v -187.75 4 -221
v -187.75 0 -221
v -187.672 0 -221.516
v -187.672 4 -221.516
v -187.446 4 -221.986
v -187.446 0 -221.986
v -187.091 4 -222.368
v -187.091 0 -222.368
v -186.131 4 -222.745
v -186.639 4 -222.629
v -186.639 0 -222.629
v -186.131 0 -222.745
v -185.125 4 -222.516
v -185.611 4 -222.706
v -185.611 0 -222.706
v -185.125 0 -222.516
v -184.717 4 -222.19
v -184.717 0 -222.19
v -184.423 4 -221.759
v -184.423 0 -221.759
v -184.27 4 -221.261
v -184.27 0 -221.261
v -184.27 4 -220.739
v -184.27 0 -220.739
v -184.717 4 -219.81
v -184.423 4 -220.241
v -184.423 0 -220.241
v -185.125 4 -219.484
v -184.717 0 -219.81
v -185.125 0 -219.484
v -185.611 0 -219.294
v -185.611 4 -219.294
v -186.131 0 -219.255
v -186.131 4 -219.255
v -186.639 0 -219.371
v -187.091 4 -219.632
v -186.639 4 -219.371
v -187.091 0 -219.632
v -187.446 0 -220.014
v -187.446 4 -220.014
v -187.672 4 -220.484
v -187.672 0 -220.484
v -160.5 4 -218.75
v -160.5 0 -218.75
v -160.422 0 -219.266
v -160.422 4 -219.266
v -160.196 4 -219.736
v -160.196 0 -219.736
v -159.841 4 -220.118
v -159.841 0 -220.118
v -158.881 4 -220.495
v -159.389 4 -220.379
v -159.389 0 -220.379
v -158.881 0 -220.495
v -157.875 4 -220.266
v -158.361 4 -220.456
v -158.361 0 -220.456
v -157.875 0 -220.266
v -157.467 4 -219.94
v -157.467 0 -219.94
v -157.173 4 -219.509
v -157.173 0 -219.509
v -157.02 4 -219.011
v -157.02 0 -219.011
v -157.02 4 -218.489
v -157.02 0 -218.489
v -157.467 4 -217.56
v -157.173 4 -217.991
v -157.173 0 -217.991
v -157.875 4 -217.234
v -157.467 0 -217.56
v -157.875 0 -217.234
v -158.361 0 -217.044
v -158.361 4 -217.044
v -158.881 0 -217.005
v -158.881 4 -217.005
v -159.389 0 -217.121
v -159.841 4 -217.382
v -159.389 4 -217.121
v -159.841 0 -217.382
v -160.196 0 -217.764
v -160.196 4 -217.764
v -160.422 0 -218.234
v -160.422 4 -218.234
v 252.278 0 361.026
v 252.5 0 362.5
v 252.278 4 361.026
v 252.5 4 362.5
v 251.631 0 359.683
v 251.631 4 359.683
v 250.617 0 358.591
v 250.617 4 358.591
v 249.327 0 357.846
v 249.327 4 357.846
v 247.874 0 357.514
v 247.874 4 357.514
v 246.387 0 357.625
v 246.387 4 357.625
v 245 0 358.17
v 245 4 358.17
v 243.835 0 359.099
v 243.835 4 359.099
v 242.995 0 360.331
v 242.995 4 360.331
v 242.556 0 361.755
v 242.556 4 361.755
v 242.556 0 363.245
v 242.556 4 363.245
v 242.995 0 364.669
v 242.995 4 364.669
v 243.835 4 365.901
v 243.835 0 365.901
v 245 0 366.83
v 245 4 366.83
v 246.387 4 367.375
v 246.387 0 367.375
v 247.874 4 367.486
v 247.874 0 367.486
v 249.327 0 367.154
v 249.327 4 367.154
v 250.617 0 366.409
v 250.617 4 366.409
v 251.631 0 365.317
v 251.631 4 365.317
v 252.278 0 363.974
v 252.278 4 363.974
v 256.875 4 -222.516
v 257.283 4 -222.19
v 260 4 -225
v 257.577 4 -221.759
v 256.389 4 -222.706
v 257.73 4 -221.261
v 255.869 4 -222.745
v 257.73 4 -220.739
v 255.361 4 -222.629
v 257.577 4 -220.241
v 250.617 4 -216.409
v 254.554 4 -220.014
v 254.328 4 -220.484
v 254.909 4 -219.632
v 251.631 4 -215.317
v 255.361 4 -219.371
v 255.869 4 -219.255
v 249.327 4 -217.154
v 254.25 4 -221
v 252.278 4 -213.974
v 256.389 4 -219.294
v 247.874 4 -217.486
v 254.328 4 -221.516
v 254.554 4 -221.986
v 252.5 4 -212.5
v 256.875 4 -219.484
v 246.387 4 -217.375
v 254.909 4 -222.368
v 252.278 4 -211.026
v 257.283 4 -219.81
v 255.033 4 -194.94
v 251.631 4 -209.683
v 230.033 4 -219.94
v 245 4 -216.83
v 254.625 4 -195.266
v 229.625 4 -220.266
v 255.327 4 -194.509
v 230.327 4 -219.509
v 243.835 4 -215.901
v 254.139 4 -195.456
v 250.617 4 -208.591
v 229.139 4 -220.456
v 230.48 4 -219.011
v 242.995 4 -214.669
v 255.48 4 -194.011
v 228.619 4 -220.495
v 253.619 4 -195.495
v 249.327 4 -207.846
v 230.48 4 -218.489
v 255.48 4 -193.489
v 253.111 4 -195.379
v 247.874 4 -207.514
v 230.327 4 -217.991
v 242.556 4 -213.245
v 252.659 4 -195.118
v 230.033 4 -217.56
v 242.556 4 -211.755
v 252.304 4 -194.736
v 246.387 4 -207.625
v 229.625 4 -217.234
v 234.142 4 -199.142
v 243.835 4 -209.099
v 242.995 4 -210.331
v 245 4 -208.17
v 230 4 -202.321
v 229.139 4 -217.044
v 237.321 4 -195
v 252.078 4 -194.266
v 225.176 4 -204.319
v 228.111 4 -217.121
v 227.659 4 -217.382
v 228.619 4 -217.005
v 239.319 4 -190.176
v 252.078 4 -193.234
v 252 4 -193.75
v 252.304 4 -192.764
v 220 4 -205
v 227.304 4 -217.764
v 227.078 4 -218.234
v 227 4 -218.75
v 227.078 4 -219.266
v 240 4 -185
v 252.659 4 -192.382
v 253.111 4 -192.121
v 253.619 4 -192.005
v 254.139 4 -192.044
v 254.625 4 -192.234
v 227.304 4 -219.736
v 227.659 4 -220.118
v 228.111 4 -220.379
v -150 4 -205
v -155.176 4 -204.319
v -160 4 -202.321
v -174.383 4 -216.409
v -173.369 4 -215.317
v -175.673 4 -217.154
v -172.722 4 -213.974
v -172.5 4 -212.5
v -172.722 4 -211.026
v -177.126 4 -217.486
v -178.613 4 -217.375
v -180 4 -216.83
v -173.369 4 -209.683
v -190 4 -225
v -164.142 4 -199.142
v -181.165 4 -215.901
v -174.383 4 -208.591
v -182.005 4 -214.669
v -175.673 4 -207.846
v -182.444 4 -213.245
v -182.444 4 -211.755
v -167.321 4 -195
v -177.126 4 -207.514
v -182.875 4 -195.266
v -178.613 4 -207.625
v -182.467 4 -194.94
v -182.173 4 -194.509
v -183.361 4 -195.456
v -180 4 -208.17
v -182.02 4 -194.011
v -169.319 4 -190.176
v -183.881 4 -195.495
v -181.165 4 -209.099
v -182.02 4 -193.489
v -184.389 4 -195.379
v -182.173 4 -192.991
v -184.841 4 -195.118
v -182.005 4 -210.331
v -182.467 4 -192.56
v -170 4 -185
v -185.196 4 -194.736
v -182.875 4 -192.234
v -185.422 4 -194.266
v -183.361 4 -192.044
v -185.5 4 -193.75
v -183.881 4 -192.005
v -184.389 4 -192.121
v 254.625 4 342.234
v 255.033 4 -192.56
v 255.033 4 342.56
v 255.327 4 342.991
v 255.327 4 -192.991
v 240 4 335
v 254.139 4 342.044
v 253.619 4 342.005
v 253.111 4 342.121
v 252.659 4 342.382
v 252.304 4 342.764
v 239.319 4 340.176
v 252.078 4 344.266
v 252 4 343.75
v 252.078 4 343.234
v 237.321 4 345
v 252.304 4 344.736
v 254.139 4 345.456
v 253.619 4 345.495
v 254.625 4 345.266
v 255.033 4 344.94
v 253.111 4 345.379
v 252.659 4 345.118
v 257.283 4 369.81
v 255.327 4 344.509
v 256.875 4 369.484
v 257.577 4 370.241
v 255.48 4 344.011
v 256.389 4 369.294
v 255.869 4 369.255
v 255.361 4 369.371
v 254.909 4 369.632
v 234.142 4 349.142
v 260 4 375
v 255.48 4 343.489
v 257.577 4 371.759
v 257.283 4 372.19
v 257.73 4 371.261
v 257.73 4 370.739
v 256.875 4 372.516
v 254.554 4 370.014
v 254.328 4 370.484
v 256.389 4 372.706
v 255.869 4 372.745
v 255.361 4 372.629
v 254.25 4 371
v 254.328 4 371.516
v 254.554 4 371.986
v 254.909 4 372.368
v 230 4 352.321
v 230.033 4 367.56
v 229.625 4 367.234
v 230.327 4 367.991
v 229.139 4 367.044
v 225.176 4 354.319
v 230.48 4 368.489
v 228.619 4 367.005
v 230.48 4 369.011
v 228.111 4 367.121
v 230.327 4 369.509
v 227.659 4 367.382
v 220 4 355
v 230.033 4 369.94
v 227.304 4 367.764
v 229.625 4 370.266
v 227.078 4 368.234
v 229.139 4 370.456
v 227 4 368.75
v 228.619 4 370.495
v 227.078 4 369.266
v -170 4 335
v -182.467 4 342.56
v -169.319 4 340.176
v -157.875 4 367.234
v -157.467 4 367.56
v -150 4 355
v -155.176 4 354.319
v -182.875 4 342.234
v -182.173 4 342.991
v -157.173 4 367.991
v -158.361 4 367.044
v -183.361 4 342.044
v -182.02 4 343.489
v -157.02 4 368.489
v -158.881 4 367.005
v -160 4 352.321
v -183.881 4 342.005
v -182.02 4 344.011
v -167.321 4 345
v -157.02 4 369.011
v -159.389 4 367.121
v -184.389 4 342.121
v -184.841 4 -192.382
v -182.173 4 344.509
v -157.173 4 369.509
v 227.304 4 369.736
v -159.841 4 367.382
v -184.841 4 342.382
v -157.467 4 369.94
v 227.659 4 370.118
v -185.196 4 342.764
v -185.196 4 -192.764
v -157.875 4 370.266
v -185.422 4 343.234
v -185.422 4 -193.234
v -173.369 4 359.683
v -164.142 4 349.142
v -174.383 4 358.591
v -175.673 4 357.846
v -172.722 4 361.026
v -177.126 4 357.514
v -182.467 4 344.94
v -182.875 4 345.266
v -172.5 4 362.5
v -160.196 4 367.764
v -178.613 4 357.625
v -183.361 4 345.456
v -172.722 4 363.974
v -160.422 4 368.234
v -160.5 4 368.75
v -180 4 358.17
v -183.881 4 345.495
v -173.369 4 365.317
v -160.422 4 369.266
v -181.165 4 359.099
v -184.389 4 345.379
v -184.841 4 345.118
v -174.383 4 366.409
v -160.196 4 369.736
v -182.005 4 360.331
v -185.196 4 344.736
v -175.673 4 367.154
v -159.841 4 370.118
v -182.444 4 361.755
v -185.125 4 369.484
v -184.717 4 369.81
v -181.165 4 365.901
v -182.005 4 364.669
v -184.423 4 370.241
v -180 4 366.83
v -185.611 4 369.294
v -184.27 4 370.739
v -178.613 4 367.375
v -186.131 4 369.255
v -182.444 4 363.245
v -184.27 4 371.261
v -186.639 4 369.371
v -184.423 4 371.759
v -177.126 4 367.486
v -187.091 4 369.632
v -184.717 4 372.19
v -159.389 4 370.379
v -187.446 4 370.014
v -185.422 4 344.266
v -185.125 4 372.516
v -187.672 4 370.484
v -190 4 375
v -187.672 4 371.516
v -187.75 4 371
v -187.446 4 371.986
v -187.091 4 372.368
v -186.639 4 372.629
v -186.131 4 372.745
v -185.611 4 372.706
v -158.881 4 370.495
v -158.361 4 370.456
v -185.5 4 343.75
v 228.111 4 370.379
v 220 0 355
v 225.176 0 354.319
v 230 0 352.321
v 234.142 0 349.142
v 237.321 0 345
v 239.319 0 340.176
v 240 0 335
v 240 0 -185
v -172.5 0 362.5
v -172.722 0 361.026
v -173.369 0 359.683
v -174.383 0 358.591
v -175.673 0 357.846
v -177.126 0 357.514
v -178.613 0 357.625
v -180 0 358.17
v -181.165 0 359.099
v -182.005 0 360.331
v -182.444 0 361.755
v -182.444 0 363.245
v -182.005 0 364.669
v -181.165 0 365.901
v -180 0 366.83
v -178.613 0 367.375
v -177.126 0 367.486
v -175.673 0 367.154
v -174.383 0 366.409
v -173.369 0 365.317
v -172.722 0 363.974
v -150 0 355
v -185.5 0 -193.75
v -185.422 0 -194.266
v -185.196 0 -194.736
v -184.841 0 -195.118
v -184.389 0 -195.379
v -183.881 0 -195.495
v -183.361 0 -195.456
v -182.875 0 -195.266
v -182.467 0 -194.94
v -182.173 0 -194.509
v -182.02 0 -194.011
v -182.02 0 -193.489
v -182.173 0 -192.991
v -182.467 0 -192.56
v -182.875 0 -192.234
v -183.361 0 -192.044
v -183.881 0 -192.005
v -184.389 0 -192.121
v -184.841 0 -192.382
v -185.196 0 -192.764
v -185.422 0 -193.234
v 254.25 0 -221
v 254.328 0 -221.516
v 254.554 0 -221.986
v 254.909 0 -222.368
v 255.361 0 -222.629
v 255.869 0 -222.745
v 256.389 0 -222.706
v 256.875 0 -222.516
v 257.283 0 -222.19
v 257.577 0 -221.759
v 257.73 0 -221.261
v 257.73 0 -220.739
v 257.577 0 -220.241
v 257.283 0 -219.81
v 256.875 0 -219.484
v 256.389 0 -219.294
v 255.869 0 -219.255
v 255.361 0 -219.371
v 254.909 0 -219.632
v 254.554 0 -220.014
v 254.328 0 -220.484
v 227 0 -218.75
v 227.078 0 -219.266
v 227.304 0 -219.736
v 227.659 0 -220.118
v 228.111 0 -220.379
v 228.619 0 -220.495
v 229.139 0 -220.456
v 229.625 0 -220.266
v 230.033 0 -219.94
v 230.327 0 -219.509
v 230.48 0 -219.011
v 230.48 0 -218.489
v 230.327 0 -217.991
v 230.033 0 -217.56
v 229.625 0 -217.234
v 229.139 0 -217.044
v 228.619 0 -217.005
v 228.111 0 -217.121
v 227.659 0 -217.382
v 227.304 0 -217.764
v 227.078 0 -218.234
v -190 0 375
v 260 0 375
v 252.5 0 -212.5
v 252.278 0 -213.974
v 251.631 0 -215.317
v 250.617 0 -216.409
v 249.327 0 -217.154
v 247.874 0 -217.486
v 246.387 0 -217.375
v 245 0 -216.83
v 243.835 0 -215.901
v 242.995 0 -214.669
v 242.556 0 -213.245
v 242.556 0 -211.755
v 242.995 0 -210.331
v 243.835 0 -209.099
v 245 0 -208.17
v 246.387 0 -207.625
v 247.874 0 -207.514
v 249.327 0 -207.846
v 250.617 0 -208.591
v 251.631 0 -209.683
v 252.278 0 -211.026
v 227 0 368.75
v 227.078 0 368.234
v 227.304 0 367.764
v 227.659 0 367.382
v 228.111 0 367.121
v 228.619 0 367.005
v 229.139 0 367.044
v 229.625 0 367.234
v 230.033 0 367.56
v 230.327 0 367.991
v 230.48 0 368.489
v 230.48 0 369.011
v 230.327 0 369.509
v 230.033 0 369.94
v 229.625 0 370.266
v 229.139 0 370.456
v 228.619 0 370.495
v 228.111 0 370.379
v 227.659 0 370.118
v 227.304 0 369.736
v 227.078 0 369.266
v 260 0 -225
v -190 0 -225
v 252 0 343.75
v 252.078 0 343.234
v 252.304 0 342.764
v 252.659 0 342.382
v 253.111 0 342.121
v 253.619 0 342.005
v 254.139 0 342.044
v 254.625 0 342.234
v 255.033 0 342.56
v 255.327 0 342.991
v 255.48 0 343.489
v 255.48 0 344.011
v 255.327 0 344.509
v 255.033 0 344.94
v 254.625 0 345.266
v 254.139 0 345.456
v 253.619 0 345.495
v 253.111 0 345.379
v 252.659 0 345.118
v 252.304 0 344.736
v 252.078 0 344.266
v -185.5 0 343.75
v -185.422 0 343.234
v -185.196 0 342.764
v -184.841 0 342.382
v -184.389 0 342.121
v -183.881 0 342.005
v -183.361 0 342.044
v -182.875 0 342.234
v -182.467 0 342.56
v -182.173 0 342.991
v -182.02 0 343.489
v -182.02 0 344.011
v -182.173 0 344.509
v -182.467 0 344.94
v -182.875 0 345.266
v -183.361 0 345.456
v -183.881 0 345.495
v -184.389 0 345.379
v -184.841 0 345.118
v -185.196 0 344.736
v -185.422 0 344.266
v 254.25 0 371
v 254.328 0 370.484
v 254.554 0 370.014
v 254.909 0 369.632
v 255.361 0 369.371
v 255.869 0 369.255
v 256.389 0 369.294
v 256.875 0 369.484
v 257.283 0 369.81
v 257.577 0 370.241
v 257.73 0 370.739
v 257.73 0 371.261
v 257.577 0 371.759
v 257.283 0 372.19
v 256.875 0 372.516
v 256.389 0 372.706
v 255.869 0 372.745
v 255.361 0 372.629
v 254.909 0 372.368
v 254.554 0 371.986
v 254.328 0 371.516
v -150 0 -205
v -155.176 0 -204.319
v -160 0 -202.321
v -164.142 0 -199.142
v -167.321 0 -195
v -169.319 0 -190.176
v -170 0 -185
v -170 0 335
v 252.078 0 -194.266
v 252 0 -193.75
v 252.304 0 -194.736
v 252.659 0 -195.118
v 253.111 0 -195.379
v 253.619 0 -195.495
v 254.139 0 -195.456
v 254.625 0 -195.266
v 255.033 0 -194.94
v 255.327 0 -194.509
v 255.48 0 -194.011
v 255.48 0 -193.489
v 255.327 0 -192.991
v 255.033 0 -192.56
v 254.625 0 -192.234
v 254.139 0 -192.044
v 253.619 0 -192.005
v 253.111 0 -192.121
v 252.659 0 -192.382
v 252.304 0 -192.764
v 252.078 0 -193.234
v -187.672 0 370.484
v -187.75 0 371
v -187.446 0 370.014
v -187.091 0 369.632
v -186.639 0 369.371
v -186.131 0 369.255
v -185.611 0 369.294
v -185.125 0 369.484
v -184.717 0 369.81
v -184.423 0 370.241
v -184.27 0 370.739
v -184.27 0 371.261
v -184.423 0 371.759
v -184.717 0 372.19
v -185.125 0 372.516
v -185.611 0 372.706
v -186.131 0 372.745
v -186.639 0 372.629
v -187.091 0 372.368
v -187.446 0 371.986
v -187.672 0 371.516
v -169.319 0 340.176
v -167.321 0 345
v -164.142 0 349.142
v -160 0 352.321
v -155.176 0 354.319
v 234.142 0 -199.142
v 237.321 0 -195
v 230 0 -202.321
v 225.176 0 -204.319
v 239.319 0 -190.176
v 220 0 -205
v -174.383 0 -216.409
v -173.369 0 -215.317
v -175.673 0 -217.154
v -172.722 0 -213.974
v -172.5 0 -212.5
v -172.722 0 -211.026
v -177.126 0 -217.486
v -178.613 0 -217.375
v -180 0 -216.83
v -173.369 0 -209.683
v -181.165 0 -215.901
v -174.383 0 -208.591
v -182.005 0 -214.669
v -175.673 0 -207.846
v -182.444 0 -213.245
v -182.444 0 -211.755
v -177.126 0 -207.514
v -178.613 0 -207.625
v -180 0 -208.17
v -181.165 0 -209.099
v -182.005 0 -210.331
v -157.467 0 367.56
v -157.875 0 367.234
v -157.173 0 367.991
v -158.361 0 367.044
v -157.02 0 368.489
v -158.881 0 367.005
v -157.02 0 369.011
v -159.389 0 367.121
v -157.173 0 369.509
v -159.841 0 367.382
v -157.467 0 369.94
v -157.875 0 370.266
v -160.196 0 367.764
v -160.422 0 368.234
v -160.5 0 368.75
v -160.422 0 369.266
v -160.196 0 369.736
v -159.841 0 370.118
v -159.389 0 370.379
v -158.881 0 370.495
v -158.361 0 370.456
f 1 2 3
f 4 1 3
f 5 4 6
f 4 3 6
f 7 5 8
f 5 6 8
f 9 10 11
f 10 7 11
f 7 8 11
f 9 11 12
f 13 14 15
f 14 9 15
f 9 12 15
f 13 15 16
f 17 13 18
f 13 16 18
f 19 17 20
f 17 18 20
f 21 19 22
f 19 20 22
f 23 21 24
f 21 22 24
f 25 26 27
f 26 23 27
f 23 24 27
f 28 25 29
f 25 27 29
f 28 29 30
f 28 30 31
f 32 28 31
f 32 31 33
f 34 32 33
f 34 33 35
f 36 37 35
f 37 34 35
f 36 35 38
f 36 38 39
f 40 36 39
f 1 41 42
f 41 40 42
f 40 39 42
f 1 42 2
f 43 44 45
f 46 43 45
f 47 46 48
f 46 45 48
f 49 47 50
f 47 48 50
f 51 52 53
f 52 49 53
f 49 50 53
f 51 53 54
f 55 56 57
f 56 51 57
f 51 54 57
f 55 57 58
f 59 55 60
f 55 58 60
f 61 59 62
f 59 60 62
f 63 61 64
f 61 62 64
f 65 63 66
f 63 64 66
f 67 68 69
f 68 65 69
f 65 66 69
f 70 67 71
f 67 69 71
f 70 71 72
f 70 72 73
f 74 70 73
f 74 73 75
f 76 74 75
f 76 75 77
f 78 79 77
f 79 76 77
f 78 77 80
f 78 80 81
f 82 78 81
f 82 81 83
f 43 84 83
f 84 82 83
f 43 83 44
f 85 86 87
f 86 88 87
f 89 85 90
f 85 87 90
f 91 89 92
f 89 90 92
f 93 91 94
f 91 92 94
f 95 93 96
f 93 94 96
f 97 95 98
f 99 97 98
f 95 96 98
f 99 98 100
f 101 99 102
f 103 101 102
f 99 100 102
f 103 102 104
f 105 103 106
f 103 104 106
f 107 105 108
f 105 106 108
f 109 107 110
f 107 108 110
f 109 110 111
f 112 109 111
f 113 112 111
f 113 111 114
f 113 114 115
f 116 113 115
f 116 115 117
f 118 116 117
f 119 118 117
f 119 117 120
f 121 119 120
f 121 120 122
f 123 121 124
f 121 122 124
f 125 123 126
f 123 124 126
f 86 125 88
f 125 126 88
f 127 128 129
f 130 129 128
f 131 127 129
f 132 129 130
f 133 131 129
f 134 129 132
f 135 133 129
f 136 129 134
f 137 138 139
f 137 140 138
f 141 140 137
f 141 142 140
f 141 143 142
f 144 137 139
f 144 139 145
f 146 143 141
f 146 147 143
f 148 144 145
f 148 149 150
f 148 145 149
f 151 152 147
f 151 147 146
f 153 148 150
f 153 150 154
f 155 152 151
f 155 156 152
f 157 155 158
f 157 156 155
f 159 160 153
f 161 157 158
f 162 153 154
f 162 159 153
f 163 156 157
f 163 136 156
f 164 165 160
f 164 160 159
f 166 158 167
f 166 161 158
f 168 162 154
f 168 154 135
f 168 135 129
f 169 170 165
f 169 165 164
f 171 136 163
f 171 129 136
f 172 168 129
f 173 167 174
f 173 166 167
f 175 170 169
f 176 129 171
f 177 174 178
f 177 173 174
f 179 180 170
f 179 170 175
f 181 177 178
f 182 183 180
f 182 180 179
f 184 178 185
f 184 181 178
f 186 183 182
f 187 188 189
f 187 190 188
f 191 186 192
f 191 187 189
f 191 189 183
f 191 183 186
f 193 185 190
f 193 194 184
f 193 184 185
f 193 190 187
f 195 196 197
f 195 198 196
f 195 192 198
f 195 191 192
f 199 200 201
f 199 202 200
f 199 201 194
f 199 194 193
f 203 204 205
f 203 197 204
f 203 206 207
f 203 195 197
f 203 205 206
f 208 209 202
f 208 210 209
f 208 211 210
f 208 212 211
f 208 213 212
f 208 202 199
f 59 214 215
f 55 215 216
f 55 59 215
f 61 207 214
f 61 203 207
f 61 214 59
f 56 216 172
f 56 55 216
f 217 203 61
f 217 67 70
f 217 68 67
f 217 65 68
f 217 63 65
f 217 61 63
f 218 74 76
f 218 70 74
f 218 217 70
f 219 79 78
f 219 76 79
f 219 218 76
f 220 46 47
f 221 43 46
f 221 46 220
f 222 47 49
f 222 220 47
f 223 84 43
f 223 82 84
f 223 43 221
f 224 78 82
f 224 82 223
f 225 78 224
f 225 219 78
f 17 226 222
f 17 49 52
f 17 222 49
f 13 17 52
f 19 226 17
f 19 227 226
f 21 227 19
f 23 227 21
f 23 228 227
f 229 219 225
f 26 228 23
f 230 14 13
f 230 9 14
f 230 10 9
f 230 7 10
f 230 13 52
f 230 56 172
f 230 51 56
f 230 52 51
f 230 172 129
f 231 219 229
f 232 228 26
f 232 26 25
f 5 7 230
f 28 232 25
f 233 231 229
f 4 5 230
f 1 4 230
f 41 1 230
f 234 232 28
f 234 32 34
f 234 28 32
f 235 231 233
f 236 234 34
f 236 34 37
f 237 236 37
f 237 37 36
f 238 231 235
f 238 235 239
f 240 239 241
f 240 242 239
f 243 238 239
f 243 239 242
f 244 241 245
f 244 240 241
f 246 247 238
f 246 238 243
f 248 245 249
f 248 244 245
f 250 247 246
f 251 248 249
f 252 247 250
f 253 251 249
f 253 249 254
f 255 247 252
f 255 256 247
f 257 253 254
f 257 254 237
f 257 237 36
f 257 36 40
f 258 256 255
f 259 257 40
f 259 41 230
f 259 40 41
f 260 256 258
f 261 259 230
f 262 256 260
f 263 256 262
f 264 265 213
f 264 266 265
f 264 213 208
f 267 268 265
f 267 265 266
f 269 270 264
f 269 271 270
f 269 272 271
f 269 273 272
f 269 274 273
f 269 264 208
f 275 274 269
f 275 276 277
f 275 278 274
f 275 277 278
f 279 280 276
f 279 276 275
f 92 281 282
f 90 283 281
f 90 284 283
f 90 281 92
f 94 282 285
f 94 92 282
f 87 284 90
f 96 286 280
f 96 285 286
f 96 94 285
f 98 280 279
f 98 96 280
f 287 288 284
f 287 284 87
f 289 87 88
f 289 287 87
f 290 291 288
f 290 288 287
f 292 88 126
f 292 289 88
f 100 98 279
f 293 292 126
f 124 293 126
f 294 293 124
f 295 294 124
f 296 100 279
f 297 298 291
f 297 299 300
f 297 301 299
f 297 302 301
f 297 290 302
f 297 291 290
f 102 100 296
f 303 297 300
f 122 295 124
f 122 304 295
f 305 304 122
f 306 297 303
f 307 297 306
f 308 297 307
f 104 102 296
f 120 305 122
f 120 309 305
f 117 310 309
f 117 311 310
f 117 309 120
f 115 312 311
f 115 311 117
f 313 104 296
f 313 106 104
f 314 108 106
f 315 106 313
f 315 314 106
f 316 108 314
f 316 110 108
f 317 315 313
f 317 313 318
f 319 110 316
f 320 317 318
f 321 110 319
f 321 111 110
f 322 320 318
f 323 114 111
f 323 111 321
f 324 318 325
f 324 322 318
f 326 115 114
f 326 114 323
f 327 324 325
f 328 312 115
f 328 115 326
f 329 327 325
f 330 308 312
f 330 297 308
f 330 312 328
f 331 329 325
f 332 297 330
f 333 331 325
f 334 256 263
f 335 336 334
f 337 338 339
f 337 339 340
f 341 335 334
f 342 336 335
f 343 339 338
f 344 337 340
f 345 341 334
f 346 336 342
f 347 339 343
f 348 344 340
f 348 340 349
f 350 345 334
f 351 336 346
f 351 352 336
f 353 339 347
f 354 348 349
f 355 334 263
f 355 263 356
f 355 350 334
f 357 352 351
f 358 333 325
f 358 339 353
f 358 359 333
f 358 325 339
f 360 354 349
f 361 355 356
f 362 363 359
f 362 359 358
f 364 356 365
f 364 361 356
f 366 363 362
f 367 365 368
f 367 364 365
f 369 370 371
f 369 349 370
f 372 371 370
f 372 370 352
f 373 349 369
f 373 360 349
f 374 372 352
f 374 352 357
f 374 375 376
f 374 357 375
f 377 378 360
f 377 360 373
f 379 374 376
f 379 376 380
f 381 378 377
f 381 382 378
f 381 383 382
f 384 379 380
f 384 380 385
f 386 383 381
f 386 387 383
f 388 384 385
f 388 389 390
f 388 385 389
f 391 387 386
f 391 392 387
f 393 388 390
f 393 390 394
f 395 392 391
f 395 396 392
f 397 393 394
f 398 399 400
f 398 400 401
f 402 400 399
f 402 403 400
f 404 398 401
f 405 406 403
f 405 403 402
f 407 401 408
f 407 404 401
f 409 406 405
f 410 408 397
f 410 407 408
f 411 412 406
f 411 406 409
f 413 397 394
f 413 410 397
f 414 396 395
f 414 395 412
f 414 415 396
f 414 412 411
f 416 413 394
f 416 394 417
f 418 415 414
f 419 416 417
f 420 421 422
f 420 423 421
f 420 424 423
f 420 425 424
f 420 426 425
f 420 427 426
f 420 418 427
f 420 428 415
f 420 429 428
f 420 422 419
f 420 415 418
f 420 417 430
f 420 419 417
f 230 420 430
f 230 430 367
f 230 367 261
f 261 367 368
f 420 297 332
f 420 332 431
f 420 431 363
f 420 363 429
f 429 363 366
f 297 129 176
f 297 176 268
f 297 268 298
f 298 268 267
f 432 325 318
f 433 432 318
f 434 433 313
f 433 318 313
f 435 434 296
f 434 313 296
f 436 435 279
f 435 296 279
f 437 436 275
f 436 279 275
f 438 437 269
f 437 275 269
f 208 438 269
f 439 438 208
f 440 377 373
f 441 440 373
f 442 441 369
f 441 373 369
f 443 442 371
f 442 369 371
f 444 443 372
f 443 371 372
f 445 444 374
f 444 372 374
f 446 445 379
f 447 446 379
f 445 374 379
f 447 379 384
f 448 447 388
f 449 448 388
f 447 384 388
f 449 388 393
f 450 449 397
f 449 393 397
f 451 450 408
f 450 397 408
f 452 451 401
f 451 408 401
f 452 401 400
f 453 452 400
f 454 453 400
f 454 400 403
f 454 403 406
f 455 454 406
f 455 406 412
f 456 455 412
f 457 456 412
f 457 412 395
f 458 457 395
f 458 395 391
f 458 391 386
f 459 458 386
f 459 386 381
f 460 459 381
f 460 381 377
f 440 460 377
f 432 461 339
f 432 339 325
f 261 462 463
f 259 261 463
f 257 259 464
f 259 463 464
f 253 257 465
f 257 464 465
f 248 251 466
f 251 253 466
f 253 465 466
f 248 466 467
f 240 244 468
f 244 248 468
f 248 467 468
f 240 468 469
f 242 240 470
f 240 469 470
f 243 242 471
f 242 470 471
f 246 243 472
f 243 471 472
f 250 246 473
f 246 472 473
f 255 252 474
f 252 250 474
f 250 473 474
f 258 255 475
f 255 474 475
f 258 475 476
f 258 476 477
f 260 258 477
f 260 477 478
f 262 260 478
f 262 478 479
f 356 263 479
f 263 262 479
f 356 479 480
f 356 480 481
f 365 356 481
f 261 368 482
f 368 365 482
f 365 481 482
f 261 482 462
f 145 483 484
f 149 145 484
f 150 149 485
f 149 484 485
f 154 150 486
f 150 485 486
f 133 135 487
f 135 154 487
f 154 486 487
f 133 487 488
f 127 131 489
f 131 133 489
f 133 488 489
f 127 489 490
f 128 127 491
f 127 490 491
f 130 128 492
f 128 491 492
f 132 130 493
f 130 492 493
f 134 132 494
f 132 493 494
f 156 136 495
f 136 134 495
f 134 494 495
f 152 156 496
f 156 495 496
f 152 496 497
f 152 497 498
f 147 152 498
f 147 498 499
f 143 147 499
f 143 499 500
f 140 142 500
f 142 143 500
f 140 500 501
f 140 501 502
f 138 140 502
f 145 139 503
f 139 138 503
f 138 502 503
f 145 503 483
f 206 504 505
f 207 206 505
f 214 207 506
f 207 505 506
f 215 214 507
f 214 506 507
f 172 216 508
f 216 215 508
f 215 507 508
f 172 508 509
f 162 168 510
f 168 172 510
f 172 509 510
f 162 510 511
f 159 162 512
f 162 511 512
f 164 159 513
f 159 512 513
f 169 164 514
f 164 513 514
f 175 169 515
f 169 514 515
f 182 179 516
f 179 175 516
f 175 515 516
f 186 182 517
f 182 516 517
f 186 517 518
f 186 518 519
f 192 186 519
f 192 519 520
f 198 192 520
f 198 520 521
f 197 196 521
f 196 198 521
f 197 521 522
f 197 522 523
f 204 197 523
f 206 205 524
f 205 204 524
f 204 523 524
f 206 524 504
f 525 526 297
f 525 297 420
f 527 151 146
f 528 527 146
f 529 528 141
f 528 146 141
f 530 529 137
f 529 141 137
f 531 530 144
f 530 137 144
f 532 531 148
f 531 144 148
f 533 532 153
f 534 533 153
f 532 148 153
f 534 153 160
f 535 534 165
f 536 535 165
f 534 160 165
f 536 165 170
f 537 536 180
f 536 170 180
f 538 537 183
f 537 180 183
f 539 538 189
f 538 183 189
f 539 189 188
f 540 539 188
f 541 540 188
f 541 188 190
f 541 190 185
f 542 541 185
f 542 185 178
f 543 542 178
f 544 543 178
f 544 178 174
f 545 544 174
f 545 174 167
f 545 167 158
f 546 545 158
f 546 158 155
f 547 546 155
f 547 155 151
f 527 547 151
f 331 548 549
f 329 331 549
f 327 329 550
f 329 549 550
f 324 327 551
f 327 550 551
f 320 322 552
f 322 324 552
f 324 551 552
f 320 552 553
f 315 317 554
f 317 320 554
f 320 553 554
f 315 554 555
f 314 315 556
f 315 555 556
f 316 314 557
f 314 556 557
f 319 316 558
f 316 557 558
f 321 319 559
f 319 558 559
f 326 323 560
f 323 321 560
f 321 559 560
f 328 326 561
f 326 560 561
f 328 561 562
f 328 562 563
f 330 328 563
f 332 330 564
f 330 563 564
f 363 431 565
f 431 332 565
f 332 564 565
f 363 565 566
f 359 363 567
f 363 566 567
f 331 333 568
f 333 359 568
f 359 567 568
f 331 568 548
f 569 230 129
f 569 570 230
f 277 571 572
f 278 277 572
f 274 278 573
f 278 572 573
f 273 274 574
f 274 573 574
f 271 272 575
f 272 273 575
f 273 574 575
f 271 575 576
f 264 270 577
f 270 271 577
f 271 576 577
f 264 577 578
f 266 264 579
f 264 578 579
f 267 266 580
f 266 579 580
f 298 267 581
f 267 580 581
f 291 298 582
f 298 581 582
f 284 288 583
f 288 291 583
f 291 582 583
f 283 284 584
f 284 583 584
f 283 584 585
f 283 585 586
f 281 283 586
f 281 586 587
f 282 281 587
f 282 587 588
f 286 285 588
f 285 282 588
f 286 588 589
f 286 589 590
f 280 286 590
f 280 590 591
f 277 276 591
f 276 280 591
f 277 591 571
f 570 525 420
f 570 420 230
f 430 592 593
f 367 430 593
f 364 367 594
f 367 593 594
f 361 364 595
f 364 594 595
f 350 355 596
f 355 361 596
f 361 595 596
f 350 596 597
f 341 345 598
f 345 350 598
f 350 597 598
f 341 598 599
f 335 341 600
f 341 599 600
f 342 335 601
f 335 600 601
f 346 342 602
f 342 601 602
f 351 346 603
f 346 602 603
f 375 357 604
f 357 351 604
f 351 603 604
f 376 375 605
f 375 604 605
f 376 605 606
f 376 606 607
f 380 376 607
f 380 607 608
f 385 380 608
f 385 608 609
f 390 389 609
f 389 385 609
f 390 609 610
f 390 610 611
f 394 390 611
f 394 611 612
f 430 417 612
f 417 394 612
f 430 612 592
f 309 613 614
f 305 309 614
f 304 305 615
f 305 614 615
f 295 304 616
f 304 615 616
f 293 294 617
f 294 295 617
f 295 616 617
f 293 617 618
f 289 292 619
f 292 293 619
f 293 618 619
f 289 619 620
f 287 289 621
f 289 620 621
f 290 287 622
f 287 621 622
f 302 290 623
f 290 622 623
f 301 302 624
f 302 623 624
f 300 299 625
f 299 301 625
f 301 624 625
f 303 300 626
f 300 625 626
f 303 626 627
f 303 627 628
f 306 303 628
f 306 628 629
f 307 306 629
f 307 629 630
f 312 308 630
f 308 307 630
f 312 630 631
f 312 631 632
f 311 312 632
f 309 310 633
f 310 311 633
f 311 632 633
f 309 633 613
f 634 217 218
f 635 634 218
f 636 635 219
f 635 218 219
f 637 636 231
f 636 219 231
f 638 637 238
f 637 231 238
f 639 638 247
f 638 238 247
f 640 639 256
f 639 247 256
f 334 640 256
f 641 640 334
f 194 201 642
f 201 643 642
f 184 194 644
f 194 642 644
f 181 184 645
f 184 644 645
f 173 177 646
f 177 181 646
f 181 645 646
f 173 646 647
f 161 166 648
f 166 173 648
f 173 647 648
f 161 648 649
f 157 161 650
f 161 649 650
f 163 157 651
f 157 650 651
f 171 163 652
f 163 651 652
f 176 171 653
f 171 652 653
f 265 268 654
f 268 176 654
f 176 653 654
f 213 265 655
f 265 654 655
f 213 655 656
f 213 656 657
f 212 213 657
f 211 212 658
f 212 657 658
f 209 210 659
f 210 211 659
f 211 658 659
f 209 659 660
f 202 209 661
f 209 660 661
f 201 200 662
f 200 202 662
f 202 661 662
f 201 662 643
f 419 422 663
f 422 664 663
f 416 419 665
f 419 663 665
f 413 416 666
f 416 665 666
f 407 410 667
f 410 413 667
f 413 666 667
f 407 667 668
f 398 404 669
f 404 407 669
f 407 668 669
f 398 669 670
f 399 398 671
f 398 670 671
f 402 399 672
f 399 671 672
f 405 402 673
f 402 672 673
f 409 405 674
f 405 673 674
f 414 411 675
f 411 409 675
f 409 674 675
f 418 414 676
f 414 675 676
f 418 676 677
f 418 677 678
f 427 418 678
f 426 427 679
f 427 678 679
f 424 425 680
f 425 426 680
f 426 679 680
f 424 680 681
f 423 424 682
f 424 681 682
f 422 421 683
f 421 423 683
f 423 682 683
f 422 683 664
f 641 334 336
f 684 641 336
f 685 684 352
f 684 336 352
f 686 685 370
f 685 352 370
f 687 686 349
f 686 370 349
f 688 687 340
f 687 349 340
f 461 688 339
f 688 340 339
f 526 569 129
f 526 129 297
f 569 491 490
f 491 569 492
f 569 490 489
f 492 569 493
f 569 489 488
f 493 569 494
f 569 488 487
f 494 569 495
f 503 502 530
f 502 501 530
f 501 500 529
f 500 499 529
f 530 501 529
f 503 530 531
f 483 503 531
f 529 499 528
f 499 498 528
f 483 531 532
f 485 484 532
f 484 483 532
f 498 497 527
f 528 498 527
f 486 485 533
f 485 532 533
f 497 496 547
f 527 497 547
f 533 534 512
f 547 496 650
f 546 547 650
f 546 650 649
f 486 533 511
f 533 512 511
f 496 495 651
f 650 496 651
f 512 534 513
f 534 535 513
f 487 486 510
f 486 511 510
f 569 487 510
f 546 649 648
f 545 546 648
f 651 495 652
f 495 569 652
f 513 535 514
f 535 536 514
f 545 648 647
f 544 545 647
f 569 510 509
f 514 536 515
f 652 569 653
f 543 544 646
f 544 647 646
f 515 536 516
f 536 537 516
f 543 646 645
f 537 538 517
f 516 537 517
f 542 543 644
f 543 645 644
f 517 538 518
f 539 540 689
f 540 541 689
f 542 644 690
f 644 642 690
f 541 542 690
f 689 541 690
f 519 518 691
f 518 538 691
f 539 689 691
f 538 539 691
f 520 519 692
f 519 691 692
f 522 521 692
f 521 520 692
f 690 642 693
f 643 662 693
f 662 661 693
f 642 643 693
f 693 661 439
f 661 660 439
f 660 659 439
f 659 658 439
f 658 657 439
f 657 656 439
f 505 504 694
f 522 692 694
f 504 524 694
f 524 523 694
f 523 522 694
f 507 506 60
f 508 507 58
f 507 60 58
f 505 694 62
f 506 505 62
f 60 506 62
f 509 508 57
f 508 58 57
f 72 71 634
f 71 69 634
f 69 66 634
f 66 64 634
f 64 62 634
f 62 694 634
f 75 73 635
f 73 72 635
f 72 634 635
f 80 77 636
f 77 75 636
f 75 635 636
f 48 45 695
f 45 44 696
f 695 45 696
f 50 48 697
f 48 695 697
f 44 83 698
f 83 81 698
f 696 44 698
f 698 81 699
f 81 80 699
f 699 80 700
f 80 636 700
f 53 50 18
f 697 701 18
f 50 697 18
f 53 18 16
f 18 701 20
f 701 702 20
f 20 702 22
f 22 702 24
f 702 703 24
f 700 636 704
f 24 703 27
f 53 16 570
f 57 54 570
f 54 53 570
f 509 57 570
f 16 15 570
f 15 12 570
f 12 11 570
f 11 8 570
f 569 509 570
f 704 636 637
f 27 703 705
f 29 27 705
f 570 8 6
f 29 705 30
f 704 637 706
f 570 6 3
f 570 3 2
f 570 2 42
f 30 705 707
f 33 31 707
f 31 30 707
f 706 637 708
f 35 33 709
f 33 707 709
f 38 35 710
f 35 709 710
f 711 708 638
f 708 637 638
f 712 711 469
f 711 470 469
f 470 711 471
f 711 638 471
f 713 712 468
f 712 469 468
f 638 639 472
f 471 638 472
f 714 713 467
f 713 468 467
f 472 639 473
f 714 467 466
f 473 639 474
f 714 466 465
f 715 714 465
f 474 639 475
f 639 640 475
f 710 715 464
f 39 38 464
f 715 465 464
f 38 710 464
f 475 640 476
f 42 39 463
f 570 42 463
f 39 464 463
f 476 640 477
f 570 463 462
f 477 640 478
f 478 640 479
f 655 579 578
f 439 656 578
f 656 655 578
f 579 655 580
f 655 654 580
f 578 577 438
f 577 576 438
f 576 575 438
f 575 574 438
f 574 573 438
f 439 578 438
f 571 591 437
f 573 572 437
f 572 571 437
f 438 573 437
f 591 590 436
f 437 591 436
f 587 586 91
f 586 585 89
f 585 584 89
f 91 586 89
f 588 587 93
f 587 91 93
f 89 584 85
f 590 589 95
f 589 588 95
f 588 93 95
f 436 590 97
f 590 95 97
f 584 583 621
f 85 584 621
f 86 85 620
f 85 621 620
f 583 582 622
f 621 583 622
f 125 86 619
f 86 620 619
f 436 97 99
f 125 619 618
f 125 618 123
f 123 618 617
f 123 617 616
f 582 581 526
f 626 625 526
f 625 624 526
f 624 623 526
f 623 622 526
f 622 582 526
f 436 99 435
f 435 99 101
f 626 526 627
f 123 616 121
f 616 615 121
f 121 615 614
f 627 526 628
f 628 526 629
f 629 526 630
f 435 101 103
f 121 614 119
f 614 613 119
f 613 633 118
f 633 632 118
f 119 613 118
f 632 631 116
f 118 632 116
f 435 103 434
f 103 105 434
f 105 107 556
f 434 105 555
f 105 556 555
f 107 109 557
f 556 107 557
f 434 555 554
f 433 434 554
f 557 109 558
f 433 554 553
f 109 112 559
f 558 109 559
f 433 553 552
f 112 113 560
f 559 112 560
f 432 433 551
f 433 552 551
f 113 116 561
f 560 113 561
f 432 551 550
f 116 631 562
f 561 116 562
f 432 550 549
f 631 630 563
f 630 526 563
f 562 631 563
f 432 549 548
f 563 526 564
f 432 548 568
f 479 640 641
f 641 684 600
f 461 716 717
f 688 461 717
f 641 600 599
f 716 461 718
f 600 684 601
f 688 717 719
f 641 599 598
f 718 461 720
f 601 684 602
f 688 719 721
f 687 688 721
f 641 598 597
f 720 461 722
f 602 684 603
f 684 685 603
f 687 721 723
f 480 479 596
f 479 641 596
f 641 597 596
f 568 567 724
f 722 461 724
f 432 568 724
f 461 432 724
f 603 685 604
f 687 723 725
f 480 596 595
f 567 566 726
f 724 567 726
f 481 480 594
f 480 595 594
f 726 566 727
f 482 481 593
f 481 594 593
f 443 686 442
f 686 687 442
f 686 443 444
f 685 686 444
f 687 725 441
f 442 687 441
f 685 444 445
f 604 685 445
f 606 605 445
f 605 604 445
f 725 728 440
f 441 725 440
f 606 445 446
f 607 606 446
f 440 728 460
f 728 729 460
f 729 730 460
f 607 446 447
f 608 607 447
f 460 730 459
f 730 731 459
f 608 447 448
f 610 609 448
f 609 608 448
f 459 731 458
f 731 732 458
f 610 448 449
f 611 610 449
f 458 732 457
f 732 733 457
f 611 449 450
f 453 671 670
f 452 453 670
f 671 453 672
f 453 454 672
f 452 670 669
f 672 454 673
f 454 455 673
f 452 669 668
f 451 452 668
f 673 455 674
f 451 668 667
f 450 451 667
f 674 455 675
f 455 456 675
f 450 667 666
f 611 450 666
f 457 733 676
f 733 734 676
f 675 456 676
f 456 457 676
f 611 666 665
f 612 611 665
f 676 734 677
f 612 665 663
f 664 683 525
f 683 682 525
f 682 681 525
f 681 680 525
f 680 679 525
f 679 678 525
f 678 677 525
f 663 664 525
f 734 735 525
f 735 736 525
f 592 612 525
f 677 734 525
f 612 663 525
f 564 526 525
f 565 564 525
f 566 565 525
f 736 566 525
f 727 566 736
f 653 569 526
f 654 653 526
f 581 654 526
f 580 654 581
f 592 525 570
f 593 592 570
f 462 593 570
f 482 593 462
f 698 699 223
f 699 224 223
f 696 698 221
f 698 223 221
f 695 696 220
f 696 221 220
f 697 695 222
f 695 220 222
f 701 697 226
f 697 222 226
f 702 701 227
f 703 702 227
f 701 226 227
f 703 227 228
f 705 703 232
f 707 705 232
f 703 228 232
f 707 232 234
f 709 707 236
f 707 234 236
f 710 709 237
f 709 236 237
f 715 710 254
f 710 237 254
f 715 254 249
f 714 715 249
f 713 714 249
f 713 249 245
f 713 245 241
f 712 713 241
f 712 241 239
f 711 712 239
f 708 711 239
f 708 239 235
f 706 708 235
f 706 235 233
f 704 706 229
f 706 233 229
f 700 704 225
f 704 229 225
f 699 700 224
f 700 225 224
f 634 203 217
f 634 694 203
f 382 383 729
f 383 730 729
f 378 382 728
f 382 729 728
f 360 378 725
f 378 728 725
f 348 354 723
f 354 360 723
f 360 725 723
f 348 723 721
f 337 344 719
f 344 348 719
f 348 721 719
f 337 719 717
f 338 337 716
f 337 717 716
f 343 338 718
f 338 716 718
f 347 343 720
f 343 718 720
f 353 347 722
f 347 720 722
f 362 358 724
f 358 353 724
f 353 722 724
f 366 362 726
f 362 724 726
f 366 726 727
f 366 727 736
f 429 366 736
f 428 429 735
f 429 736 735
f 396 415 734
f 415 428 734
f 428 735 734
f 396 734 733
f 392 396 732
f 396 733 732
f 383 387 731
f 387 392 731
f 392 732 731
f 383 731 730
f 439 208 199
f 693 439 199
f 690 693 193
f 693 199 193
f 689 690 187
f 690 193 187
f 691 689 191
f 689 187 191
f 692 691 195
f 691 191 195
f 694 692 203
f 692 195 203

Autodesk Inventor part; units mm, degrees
ref_plane "YZ Plane" through (0, 0, 0) normal (1, 0, 0) x (0, 1, 0)
ref_plane "XZ Plane" through (0, 0, 0) normal (0, 1, 0) x (-1, 0, 0)
ref_plane "XY Plane" through (0, 0, 0) normal (0, 0, 1) x (1, 0, 0)
sketch "Эскиз1" plane through (0, 0, 0) normal (0, 1, 0) x (-1, 0, 0)
  line L0 (-260, 375) -> (190, 375)
  line L1 (190, 375) -> (190, -225)
  line L2 (190, -225) -> (-260, -225)
  line L3 (-260, -225) -> (-260, 375)
  line L4 (-260, 375) -> (190, -225) construction
  line L5 (190, 375) -> (-260, -225) construction
  circle A0 centre (-228.75, 368.75) radius 1.75
  circle A1 centre (-253.75, 343.75) radius 1.75
  circle A2 centre (-256, 371) radius 1.75
  circle A3 centre (186, 371) radius 1.75
  circle A4 centre (183.75, 343.75) radius 1.75
  circle A5 centre (158.75, 368.75) radius 1.75
  circle A6 centre (183.75, -193.75) radius 1.75
  circle A7 centre (186, -221) radius 1.75
  circle A8 centre (158.75, -218.75) radius 1.75
  circle A9 centre (-253.75, -193.75) radius 1.75
  circle A10 centre (-256, -221) radius 1.75
  circle A11 centre (-228.75, -218.75) radius 1.75
  line L6 (170, -205) -> (170, 355)
  line L7 (170, 355) -> (-240, 355)
  line L8 (-240, 355) -> (-240, -205)
  line L9 (-240, -205) -> (170, -205)
  point P0 (0, 0)
  dimension "d0" = 450
  dimension "d1" = 600
  dimension "d11" = 20
  dimension "d21" = 27.25
  dimension "d22" = 2.25
  dimension "d23" = 27.25
  dimension "d24" = 2.25
  dimension "d25" = 4
  dimension "d26" = 4
  dimension "d27" = 27.25
  dimension "d28" = 4
  dimension "d29" = 4
  dimension "d30" = 27.25
  dimension "d31" = 2.25
  dimension "d32" = 2.25
  dimension "d34" = 27.25
  dimension "d35" = 27.25
  dimension "d36" = 2.25
  dimension "d37" = 2.25
  dimension "d38" = 4
  dimension "d39" = 4
  dimension "d40" = 27.25
  dimension "d41" = 27.25
  dimension "d42" = 2.25
  dimension "d43" = 2.25
  dimension "d44" = 4
  dimension "d45" = 4
extrude "Выдавливание1" add sketch "Эскиз1" along normal blind 4
fillet "Сопряжение1" radius 20 4 edges at (240, 2, -205) (-170, 2, -205) (-170, 2, 355) (240, 2, 355)
sketch "Эскиз2" plane through (0, 4, 0) normal (0, 1, 0) x (1, 0, 0)
  circle A0 centre (-177.5, 212.5) radius 7 projected
  circle A1 centre (247.5, 212.5) radius 7 projected
  circle A2 centre (247.5, -362.5) radius 7 projected
  circle A3 centre (-177.5, -362.5) radius 7 projected
  circle A4 centre (-177.5, -362.5) radius 5
  circle A5 centre (247.5, -362.5) radius 5
  circle A6 centre (247.5, 212.5) radius 5
  circle A7 centre (-177.5, 212.5) radius 5
  line L0 (260, 225) -> (-190, 225) projected
  point P0 (0, 0)
  dimension "d15" = 10
  dimension "d16" = 10
  dimension "d17" = 10
  dimension "d18" = 10
  dimension "d33" = 12.5
extrude "Выдавливание2" cut sketch "Эскиз2" against normal through all contours A4 | A5 | A6 | A7
properties part number "top_plate"
